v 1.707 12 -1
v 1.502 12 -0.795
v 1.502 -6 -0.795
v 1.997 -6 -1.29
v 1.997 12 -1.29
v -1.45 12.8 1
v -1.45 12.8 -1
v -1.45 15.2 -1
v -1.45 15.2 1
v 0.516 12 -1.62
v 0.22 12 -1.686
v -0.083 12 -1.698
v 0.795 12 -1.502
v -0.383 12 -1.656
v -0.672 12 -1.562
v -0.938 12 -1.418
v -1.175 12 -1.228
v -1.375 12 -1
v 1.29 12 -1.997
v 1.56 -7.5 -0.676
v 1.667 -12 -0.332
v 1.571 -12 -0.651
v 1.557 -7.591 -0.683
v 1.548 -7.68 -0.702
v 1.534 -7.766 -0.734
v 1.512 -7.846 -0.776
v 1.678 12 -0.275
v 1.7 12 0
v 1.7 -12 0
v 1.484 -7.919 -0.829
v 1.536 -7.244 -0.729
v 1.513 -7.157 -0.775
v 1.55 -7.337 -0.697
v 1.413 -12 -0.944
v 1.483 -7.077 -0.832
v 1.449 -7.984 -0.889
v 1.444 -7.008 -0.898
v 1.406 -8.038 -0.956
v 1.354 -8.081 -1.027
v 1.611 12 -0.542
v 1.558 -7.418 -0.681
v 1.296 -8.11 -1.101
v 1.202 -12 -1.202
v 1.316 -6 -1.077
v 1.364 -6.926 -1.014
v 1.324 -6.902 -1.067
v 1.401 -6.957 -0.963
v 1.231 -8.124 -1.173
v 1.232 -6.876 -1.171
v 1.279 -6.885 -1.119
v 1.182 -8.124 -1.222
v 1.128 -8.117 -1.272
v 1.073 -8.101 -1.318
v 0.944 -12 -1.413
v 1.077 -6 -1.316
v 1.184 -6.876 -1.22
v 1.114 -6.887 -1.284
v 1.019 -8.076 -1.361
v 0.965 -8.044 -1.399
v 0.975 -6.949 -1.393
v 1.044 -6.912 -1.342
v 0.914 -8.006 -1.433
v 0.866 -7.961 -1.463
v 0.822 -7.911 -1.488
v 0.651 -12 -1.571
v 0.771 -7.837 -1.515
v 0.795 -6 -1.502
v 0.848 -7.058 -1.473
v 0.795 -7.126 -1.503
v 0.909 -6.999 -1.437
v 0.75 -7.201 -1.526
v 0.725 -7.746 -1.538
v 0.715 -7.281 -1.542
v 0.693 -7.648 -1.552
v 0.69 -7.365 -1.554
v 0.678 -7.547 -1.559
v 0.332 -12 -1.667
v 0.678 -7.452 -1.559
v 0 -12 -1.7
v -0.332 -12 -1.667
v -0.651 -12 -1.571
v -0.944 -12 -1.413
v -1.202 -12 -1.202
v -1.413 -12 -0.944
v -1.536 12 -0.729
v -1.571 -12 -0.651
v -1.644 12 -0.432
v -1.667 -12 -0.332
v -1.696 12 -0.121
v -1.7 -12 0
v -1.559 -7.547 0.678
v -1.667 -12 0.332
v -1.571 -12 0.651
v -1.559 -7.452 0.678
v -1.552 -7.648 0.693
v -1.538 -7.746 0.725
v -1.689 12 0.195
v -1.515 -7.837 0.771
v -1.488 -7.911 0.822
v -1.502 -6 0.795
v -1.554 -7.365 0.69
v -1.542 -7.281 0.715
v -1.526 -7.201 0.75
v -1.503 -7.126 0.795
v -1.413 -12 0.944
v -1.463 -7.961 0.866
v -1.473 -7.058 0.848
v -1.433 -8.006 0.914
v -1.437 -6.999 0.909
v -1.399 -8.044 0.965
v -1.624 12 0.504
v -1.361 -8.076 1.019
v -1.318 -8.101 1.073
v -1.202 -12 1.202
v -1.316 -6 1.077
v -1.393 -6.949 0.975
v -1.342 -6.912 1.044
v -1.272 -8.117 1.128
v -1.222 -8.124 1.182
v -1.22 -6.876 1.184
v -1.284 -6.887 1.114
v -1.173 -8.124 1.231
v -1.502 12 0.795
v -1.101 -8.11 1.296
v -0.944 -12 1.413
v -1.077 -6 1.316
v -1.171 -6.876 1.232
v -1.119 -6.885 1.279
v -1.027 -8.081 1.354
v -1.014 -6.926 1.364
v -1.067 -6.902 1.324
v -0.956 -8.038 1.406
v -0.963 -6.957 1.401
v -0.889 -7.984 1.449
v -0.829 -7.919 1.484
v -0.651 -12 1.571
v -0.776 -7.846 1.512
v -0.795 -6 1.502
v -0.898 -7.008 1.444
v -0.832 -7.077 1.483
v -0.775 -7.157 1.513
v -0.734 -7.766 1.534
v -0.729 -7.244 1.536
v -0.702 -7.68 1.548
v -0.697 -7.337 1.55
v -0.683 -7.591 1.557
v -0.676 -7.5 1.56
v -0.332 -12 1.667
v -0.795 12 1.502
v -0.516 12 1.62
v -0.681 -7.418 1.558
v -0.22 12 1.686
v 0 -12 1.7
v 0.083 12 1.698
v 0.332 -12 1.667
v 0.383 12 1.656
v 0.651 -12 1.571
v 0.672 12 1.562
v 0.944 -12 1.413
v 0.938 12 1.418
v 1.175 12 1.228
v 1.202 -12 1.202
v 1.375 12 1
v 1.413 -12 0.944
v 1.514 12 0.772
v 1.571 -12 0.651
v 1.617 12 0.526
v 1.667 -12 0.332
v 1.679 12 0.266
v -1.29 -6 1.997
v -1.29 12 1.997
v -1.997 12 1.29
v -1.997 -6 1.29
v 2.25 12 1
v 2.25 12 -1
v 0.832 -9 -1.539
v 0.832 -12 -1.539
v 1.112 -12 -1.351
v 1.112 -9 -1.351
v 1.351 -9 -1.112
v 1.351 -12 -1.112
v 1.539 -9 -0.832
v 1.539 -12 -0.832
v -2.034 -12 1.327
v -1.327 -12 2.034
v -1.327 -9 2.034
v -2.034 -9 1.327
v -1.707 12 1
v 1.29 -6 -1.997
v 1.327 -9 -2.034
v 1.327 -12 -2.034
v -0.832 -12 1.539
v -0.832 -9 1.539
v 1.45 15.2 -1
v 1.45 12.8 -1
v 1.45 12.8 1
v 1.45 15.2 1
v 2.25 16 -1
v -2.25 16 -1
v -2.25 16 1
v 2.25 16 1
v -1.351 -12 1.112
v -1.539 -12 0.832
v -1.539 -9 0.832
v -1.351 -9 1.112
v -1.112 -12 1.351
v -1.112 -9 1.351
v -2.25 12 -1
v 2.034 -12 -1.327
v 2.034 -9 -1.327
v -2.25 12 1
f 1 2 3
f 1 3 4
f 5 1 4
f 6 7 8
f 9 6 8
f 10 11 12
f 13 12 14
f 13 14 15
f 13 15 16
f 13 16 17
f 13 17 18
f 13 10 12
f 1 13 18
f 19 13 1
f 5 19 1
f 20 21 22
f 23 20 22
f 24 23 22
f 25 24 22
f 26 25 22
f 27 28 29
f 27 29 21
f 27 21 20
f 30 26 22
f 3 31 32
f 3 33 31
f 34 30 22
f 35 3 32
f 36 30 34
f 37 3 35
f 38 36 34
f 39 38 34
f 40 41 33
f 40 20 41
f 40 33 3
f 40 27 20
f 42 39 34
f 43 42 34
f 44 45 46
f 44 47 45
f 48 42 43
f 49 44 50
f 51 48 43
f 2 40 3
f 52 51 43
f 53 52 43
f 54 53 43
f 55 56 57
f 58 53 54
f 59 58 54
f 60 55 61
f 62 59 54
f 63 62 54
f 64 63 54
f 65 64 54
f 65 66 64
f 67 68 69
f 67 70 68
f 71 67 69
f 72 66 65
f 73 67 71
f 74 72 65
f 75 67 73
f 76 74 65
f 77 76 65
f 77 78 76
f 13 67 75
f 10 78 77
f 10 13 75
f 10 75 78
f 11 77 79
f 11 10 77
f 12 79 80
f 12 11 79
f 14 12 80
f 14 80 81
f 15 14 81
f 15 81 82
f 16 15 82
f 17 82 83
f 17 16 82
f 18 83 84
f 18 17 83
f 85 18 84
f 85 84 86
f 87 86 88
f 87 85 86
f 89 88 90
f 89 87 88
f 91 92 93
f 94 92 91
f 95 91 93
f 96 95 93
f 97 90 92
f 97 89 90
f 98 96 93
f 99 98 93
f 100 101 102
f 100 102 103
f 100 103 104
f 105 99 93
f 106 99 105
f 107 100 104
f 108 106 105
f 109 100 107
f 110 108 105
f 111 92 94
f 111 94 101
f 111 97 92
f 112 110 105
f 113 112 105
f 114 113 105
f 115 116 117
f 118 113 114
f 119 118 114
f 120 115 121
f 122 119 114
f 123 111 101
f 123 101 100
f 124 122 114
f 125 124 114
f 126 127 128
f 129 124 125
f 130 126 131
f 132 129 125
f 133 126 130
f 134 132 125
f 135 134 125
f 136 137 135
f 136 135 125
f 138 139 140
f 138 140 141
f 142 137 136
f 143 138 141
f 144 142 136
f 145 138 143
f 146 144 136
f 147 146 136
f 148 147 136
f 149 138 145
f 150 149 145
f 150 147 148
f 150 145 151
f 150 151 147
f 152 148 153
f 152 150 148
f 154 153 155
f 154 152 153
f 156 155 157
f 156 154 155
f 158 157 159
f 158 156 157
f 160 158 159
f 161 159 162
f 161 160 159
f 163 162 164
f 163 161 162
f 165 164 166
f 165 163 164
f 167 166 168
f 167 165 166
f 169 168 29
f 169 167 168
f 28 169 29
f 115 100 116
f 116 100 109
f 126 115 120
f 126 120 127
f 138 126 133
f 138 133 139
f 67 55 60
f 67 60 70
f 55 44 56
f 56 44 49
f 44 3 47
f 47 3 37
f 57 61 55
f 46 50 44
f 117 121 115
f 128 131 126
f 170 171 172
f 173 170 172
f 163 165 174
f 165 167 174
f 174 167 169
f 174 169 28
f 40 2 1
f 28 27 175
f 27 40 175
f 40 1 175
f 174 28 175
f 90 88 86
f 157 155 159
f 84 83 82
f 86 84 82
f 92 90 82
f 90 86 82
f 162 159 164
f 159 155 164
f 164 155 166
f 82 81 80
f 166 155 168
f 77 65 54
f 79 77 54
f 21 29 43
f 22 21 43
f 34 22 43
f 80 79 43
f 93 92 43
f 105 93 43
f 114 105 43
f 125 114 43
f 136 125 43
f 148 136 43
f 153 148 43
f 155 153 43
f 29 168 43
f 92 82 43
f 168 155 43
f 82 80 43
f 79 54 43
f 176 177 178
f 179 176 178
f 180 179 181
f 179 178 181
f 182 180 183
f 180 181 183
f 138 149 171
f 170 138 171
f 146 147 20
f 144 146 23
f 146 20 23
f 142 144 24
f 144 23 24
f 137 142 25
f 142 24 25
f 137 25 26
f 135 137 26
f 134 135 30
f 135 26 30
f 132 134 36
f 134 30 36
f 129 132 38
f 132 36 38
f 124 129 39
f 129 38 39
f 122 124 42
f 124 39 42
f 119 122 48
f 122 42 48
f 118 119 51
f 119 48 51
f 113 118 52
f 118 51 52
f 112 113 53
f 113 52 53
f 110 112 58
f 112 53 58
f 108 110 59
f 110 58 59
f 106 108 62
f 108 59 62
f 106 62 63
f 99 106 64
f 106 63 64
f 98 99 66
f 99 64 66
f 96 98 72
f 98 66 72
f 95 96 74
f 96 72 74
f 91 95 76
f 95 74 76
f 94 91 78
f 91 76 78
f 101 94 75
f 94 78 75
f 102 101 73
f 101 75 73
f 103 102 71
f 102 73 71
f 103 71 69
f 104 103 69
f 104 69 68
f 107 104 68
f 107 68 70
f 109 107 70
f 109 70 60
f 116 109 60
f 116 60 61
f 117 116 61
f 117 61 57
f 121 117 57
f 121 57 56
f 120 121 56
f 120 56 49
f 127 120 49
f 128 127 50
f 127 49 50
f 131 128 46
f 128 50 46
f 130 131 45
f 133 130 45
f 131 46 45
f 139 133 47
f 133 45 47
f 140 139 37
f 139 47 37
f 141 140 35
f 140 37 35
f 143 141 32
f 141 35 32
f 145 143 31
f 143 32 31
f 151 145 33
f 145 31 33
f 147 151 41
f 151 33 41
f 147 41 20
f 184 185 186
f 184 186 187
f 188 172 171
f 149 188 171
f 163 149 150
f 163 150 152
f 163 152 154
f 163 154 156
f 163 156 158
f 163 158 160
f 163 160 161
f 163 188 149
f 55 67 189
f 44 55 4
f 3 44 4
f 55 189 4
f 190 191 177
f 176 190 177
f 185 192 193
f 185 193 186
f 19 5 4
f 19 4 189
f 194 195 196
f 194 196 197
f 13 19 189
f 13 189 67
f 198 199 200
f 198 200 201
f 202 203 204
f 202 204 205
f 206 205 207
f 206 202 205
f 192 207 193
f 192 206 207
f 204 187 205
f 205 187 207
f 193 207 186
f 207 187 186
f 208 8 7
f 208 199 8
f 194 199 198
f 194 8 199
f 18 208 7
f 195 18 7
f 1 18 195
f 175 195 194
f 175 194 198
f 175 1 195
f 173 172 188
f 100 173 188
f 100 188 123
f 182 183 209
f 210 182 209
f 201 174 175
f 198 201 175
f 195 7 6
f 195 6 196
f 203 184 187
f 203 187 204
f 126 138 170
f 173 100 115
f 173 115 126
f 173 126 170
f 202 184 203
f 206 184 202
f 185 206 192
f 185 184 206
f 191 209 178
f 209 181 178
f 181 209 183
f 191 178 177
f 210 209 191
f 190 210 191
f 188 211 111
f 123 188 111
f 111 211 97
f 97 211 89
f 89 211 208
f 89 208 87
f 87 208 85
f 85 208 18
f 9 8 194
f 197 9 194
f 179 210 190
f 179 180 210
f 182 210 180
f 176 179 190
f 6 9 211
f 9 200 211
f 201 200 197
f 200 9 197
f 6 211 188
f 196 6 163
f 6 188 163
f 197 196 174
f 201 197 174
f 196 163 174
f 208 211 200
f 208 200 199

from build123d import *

# Parameters (mm, degrees)
SKETCH1_R             = 1.7
MAIN_BODY_DEPTH       = 12
TOP_GUIDES_DEPTH      = 18
BOTTOM_GUIDES_DEPTH   = 3
BOTTOM_GUIDES_2_DEPTH = 3
SKETCH10_W            = 4.5
SKETCH10_H            = 2
HOLE_EXTRUDE_DEPTH    = 4
SKETCH11_W            = 2.9
SKETCH11_H            = 2.4
HOLE_CUT_DEPTH        = 4.03438226
SKETCH12_W            = 0.625
SKETCH12_H            = 5.328201779


with BuildPart() as part:
    # Sketch1 → main body (new body, symmetric)
    with BuildSketch(Plane(origin=(0, 0, 0), x_dir=(1, 0, 0), z_dir=(0, 1, 0))):
        Circle(SKETCH1_R)
    extrude(amount=MAIN_BODY_DEPTH, both=True)

    # Sketch2 → top guides (add)
    with BuildSketch(Plane(origin=(0, 12, 0), x_dir=(1, 0, 0), z_dir=(0, 1, 0))):
        with BuildLine():
            Line((-0.795359139, -1.50246592), (-1.290333886, -1.997440667))
            Line((-1.290333886, -1.997440667), (-1.997440667, -1.290333886))
            Line((-1.997440667, -1.290333886), (-1.50246592, -0.795359139))
            ThreePointArc((-1.50246592, -0.795359139), (-1.202081528, -1.202081528), (-0.795359139, -1.50246592))
        make_face()
        with BuildLine():
            Line((1.290333886, 1.997440667), (0.795359139, 1.50246592))
            ThreePointArc((0.795359139, 1.50246592), (1.202081528, 1.202081528), (1.50246592, 0.795359139))
            Line((1.50246592, 0.795359139), (1.997440667, 1.290333886))
            Line((1.997440667, 1.290333886), (1.290333886, 1.997440667))
        make_face()
    extrude(amount=-TOP_GUIDES_DEPTH)

    # Sketch10 → hole extrude (add)
    with BuildSketch(Plane(origin=(0, 12, 0), x_dir=(1, 0, 0), z_dir=(0, 1, 0))):
        Rectangle(SKETCH10_W, SKETCH10_H)
    extrude(amount=HOLE_EXTRUDE_DEPTH)

    # Sketch11 → hole cut (cut, through all)
    with BuildSketch(Plane.XY.offset(-1)):
        with Locations((0, 14)):
            Rectangle(SKETCH11_W, SKETCH11_H)
    extrude(amount=HOLE_CUT_DEPTH, mode=Mode.SUBTRACT)

    # Sketch12 → M1.6 Tapped Hole4 (revolve, cut)
    with BuildSketch(Plane(origin=(-1.643887276, -7.5, 1.643887276), x_dir=(0.707106781, 0, 0.707106781), z_dir=(0, 1, 0))):
        with Locations((0.3125, 2.66410089)):
            Rectangle(SKETCH12_W, SKETCH12_H)
    revolve(axis=Axis((-6.134015337, -7.5, 6.134015337), (0.707106781, 0, -0.707106781)), mode=Mode.SUBTRACT)


with BuildPart() as body_2:
    # Sketch7 → bottom guides (new body)
    with BuildSketch(Plane.XZ.offset(12)):
        with BuildLine():
            Line((1.539407513, -0.832300732), (2.03438226, -1.327275479))
            Line((2.03438226, -1.327275479), (1.327275479, -2.03438226))
            Line((1.327275479, -2.03438226), (0.832300732, -1.539407513))
            ThreePointArc((0.832300732, -1.539407513), (1.237436867, -1.237436867), (1.539407513, -0.832300732))
        make_face()
    extrude(amount=-BOTTOM_GUIDES_DEPTH)


with BuildPart() as body_3:
    # Sketch7 → bottom guides 2 (new body)
    with BuildSketch(Plane.XZ.offset(12)):
        with BuildLine():
            Line((-2.03438226, 1.327275479), (-1.539407513, 0.832300732))
            ThreePointArc((-1.539407513, 0.832300732), (-1.237436867, 1.237436867), (-0.832300732, 1.539407513))
            Line((-0.832300732, 1.539407513), (-1.327275479, 2.03438226))
            Line((-1.327275479, 2.03438226), (-2.03438226, 1.327275479))
        make_face()
    extrude(amount=-BOTTOM_GUIDES_2_DEPTH)


solid = Compound([part.part, body_2.part, body_3.part])
